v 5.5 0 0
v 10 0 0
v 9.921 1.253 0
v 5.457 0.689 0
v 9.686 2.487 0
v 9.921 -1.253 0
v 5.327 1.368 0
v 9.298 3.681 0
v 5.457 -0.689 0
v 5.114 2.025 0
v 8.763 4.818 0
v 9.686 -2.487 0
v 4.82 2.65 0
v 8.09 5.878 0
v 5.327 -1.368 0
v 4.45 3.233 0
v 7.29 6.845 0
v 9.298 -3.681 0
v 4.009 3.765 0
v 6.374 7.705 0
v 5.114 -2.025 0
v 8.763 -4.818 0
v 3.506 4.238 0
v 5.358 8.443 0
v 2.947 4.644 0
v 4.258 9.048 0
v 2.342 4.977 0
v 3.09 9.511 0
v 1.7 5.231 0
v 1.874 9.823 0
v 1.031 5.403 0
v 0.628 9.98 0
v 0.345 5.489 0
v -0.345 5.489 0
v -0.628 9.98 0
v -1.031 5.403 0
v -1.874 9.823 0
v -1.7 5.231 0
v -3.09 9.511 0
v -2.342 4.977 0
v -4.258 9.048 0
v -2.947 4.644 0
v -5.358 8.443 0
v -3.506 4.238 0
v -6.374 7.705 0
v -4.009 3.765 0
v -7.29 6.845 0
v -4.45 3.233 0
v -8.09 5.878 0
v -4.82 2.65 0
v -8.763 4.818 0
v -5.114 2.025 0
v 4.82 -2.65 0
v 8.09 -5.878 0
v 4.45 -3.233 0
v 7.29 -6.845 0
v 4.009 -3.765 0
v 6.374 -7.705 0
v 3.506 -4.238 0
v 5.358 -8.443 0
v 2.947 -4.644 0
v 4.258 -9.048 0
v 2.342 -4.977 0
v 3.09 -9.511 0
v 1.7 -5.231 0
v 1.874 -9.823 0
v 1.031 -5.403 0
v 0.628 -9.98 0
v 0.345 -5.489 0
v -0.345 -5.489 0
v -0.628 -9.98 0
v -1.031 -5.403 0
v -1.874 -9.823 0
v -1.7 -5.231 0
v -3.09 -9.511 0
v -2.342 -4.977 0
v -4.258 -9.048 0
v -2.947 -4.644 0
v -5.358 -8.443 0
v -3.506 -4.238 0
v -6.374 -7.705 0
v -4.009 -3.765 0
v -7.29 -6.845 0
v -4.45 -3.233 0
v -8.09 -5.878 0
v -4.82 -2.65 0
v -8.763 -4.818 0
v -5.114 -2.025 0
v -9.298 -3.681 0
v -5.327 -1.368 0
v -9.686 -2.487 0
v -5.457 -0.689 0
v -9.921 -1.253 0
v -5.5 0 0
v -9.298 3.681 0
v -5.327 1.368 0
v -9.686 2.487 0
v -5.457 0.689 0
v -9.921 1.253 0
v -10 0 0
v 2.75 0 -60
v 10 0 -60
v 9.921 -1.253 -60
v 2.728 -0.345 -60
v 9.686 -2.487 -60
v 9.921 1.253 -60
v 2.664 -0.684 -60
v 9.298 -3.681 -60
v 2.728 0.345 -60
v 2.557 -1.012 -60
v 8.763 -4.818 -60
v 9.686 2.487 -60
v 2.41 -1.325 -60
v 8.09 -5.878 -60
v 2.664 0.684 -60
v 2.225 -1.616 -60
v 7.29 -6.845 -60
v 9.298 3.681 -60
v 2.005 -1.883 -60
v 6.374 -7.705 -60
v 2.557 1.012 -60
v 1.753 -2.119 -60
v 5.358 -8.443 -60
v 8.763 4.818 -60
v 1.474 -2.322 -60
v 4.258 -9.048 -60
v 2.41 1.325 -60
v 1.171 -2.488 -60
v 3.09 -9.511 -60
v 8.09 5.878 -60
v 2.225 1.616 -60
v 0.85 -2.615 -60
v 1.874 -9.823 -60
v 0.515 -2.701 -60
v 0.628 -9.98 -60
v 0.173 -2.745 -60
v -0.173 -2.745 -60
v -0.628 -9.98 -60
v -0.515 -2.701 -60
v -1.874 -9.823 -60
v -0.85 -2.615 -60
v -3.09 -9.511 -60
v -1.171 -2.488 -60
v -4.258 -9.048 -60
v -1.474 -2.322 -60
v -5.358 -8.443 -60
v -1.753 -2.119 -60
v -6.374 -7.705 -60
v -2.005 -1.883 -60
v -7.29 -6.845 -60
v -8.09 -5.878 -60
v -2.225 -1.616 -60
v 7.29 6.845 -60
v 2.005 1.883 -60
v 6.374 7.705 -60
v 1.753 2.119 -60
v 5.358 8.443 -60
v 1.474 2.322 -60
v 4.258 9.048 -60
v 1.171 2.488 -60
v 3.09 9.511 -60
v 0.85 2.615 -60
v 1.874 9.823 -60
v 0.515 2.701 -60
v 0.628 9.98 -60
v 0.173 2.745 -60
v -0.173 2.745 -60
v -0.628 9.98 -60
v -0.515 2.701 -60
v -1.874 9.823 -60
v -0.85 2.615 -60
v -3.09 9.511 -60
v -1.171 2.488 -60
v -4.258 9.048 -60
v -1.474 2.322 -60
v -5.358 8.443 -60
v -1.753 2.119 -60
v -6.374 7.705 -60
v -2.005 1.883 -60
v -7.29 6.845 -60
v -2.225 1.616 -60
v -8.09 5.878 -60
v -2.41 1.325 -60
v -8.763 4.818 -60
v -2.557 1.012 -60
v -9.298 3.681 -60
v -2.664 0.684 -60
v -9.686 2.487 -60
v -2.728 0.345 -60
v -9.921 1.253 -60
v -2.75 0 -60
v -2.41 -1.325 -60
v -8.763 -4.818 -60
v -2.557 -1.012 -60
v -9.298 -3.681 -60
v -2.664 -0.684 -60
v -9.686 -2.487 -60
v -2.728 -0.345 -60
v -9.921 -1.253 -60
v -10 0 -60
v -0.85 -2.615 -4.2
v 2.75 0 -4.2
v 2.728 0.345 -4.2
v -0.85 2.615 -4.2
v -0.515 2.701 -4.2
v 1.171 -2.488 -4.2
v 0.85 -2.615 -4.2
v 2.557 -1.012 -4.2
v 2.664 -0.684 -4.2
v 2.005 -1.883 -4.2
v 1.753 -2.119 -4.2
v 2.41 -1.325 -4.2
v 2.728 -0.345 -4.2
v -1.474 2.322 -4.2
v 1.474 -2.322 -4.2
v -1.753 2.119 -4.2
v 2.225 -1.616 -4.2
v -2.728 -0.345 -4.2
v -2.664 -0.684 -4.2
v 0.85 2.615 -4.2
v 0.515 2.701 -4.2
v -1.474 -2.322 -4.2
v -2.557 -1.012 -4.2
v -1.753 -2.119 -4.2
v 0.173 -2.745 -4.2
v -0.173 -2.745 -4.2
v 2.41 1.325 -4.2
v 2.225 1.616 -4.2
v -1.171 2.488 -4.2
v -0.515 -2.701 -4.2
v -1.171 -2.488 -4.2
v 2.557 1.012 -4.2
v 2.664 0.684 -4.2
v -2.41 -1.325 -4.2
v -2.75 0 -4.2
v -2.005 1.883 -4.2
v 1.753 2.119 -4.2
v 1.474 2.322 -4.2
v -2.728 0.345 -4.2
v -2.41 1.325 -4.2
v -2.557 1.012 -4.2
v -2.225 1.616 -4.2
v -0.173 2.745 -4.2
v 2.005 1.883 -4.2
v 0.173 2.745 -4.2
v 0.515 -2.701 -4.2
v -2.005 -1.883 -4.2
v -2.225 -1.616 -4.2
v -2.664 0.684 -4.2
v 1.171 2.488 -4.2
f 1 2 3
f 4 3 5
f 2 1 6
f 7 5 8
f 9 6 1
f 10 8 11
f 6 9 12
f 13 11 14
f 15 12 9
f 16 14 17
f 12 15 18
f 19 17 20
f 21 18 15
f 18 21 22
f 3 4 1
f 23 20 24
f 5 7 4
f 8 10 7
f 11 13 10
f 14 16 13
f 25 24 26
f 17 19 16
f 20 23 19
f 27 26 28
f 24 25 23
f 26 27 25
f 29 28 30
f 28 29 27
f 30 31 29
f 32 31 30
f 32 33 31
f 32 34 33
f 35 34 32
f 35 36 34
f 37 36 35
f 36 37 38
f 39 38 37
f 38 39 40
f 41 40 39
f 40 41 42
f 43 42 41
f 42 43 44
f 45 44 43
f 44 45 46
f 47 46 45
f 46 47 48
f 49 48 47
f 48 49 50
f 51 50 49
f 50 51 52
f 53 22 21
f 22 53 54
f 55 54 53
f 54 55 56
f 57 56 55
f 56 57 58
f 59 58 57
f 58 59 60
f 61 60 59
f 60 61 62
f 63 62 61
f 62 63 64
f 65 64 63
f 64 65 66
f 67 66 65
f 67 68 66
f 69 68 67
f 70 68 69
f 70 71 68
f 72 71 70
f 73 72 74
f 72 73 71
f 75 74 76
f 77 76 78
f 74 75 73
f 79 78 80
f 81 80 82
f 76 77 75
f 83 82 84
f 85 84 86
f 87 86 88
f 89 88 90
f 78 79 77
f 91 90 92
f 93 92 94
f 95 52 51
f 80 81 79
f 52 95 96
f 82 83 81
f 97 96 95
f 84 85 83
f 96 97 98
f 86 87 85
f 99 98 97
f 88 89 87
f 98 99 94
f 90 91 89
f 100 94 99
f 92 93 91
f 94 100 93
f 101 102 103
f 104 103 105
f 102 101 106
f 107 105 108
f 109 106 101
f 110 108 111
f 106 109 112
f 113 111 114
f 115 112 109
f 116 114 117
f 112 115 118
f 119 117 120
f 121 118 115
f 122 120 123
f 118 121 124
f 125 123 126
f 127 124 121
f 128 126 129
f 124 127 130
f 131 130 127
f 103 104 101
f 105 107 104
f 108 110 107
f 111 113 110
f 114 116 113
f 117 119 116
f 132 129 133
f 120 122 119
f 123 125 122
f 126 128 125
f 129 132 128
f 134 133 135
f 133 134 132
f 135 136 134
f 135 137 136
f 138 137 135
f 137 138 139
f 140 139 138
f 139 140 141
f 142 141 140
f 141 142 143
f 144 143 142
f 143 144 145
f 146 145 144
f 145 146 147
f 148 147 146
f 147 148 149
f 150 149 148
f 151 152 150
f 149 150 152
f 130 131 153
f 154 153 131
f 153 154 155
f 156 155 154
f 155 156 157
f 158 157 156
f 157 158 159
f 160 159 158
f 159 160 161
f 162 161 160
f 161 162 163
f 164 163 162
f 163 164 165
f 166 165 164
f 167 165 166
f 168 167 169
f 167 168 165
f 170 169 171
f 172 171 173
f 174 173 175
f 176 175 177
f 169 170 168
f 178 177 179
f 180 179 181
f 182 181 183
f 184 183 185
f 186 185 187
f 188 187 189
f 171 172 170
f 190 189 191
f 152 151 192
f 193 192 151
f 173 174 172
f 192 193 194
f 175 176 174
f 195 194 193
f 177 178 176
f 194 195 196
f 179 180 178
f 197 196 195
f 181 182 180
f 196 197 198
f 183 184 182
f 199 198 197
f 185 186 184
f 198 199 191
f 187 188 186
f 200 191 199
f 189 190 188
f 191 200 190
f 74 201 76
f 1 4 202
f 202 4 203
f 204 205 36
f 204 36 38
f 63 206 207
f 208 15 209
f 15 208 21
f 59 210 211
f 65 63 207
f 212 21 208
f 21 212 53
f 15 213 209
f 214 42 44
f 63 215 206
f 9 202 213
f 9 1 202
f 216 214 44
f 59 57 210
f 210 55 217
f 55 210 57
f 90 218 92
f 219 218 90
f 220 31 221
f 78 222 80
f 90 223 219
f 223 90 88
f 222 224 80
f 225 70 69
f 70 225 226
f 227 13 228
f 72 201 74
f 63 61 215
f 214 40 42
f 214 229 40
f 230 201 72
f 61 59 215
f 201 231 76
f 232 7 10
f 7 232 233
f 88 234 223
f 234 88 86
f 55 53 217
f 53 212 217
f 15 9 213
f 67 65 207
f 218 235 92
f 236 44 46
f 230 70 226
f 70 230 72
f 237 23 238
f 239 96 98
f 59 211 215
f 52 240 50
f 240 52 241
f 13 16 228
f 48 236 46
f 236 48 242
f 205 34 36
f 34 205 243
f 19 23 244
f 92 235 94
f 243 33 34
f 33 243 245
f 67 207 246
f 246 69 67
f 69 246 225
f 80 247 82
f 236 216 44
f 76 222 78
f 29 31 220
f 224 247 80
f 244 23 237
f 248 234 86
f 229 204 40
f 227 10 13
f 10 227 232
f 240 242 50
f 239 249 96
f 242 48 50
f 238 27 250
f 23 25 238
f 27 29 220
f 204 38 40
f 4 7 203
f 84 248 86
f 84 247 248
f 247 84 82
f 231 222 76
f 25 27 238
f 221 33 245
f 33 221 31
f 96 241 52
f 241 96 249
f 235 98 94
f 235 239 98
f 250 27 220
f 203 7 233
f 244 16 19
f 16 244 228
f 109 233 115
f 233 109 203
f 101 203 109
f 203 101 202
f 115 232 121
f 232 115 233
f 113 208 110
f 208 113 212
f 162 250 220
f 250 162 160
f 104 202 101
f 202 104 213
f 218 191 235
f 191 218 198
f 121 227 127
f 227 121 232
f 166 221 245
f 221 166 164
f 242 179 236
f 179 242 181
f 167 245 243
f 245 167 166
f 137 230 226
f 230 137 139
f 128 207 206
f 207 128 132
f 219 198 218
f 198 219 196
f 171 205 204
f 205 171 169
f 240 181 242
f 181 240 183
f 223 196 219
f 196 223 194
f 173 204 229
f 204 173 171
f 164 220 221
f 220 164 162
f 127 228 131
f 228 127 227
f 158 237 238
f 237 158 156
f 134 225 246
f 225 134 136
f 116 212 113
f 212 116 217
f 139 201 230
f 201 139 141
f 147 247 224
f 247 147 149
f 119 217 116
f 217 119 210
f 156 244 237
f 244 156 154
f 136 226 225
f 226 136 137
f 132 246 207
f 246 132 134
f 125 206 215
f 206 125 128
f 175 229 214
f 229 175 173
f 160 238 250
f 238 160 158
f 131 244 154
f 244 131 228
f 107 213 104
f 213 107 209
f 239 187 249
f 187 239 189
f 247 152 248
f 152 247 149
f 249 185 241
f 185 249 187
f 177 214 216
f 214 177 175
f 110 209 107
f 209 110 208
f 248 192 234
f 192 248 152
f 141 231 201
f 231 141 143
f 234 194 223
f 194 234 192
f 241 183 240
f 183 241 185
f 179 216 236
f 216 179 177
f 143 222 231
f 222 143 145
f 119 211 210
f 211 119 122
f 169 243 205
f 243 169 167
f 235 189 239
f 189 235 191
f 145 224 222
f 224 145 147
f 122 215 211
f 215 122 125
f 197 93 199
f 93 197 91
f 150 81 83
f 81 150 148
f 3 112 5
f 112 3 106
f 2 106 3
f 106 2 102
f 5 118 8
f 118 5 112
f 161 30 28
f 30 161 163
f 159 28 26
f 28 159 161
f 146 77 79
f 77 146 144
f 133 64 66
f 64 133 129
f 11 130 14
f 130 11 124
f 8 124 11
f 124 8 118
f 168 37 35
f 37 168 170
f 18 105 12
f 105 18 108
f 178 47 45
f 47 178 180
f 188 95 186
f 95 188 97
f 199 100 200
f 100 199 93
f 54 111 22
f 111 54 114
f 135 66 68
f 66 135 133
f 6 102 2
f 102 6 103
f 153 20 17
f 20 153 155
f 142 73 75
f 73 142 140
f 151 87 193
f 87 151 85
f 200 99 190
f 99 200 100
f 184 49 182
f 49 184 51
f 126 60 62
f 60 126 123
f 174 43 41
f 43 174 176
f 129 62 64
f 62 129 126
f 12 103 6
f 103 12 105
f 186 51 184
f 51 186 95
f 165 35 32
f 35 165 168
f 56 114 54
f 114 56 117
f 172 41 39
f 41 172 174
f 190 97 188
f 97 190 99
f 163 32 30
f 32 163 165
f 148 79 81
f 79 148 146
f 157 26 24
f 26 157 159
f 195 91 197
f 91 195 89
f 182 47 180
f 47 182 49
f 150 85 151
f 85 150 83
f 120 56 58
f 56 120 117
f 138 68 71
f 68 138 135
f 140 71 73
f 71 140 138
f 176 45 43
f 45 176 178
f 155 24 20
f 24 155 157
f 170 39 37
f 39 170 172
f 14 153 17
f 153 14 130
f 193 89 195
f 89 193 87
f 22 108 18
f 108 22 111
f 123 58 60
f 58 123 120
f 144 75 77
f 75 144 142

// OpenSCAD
$fn = 50;


difference() {
	union() {
		translate(v = [0, 0, -60.0000000000]) {
			cylinder(h = 60, r = 10.0000000000);
		}
		cylinder(h = 0, r = 20.0000000000);
	}
	union() {
		translate(v = [0, 0, 0]) {
			rotate(a = [0, 0, 0]) {
				difference() {
					union() {
						#translate(v = [0, 0, -60.0000000000]) {
							cylinder(h = 60, r = 2.2500000000);
						}
						#translate(v = [0, 0, -4.2000000000]) {
							cylinder(h = 4.2000000000, r = 10.0000000000, r1 = 2.7500000000, r2 = 5.5000000000);
						}
						#translate(v = [0, 0, -60.0000000000]) {
							cylinder(h = 60, r = 2.7500000000);
						}
						#translate(v = [0, 0, -60.0000000000]) {
							cylinder(h = 60, r = 2.2500000000);
						}
					}
					union();
				}
			}
		}
	}
}
